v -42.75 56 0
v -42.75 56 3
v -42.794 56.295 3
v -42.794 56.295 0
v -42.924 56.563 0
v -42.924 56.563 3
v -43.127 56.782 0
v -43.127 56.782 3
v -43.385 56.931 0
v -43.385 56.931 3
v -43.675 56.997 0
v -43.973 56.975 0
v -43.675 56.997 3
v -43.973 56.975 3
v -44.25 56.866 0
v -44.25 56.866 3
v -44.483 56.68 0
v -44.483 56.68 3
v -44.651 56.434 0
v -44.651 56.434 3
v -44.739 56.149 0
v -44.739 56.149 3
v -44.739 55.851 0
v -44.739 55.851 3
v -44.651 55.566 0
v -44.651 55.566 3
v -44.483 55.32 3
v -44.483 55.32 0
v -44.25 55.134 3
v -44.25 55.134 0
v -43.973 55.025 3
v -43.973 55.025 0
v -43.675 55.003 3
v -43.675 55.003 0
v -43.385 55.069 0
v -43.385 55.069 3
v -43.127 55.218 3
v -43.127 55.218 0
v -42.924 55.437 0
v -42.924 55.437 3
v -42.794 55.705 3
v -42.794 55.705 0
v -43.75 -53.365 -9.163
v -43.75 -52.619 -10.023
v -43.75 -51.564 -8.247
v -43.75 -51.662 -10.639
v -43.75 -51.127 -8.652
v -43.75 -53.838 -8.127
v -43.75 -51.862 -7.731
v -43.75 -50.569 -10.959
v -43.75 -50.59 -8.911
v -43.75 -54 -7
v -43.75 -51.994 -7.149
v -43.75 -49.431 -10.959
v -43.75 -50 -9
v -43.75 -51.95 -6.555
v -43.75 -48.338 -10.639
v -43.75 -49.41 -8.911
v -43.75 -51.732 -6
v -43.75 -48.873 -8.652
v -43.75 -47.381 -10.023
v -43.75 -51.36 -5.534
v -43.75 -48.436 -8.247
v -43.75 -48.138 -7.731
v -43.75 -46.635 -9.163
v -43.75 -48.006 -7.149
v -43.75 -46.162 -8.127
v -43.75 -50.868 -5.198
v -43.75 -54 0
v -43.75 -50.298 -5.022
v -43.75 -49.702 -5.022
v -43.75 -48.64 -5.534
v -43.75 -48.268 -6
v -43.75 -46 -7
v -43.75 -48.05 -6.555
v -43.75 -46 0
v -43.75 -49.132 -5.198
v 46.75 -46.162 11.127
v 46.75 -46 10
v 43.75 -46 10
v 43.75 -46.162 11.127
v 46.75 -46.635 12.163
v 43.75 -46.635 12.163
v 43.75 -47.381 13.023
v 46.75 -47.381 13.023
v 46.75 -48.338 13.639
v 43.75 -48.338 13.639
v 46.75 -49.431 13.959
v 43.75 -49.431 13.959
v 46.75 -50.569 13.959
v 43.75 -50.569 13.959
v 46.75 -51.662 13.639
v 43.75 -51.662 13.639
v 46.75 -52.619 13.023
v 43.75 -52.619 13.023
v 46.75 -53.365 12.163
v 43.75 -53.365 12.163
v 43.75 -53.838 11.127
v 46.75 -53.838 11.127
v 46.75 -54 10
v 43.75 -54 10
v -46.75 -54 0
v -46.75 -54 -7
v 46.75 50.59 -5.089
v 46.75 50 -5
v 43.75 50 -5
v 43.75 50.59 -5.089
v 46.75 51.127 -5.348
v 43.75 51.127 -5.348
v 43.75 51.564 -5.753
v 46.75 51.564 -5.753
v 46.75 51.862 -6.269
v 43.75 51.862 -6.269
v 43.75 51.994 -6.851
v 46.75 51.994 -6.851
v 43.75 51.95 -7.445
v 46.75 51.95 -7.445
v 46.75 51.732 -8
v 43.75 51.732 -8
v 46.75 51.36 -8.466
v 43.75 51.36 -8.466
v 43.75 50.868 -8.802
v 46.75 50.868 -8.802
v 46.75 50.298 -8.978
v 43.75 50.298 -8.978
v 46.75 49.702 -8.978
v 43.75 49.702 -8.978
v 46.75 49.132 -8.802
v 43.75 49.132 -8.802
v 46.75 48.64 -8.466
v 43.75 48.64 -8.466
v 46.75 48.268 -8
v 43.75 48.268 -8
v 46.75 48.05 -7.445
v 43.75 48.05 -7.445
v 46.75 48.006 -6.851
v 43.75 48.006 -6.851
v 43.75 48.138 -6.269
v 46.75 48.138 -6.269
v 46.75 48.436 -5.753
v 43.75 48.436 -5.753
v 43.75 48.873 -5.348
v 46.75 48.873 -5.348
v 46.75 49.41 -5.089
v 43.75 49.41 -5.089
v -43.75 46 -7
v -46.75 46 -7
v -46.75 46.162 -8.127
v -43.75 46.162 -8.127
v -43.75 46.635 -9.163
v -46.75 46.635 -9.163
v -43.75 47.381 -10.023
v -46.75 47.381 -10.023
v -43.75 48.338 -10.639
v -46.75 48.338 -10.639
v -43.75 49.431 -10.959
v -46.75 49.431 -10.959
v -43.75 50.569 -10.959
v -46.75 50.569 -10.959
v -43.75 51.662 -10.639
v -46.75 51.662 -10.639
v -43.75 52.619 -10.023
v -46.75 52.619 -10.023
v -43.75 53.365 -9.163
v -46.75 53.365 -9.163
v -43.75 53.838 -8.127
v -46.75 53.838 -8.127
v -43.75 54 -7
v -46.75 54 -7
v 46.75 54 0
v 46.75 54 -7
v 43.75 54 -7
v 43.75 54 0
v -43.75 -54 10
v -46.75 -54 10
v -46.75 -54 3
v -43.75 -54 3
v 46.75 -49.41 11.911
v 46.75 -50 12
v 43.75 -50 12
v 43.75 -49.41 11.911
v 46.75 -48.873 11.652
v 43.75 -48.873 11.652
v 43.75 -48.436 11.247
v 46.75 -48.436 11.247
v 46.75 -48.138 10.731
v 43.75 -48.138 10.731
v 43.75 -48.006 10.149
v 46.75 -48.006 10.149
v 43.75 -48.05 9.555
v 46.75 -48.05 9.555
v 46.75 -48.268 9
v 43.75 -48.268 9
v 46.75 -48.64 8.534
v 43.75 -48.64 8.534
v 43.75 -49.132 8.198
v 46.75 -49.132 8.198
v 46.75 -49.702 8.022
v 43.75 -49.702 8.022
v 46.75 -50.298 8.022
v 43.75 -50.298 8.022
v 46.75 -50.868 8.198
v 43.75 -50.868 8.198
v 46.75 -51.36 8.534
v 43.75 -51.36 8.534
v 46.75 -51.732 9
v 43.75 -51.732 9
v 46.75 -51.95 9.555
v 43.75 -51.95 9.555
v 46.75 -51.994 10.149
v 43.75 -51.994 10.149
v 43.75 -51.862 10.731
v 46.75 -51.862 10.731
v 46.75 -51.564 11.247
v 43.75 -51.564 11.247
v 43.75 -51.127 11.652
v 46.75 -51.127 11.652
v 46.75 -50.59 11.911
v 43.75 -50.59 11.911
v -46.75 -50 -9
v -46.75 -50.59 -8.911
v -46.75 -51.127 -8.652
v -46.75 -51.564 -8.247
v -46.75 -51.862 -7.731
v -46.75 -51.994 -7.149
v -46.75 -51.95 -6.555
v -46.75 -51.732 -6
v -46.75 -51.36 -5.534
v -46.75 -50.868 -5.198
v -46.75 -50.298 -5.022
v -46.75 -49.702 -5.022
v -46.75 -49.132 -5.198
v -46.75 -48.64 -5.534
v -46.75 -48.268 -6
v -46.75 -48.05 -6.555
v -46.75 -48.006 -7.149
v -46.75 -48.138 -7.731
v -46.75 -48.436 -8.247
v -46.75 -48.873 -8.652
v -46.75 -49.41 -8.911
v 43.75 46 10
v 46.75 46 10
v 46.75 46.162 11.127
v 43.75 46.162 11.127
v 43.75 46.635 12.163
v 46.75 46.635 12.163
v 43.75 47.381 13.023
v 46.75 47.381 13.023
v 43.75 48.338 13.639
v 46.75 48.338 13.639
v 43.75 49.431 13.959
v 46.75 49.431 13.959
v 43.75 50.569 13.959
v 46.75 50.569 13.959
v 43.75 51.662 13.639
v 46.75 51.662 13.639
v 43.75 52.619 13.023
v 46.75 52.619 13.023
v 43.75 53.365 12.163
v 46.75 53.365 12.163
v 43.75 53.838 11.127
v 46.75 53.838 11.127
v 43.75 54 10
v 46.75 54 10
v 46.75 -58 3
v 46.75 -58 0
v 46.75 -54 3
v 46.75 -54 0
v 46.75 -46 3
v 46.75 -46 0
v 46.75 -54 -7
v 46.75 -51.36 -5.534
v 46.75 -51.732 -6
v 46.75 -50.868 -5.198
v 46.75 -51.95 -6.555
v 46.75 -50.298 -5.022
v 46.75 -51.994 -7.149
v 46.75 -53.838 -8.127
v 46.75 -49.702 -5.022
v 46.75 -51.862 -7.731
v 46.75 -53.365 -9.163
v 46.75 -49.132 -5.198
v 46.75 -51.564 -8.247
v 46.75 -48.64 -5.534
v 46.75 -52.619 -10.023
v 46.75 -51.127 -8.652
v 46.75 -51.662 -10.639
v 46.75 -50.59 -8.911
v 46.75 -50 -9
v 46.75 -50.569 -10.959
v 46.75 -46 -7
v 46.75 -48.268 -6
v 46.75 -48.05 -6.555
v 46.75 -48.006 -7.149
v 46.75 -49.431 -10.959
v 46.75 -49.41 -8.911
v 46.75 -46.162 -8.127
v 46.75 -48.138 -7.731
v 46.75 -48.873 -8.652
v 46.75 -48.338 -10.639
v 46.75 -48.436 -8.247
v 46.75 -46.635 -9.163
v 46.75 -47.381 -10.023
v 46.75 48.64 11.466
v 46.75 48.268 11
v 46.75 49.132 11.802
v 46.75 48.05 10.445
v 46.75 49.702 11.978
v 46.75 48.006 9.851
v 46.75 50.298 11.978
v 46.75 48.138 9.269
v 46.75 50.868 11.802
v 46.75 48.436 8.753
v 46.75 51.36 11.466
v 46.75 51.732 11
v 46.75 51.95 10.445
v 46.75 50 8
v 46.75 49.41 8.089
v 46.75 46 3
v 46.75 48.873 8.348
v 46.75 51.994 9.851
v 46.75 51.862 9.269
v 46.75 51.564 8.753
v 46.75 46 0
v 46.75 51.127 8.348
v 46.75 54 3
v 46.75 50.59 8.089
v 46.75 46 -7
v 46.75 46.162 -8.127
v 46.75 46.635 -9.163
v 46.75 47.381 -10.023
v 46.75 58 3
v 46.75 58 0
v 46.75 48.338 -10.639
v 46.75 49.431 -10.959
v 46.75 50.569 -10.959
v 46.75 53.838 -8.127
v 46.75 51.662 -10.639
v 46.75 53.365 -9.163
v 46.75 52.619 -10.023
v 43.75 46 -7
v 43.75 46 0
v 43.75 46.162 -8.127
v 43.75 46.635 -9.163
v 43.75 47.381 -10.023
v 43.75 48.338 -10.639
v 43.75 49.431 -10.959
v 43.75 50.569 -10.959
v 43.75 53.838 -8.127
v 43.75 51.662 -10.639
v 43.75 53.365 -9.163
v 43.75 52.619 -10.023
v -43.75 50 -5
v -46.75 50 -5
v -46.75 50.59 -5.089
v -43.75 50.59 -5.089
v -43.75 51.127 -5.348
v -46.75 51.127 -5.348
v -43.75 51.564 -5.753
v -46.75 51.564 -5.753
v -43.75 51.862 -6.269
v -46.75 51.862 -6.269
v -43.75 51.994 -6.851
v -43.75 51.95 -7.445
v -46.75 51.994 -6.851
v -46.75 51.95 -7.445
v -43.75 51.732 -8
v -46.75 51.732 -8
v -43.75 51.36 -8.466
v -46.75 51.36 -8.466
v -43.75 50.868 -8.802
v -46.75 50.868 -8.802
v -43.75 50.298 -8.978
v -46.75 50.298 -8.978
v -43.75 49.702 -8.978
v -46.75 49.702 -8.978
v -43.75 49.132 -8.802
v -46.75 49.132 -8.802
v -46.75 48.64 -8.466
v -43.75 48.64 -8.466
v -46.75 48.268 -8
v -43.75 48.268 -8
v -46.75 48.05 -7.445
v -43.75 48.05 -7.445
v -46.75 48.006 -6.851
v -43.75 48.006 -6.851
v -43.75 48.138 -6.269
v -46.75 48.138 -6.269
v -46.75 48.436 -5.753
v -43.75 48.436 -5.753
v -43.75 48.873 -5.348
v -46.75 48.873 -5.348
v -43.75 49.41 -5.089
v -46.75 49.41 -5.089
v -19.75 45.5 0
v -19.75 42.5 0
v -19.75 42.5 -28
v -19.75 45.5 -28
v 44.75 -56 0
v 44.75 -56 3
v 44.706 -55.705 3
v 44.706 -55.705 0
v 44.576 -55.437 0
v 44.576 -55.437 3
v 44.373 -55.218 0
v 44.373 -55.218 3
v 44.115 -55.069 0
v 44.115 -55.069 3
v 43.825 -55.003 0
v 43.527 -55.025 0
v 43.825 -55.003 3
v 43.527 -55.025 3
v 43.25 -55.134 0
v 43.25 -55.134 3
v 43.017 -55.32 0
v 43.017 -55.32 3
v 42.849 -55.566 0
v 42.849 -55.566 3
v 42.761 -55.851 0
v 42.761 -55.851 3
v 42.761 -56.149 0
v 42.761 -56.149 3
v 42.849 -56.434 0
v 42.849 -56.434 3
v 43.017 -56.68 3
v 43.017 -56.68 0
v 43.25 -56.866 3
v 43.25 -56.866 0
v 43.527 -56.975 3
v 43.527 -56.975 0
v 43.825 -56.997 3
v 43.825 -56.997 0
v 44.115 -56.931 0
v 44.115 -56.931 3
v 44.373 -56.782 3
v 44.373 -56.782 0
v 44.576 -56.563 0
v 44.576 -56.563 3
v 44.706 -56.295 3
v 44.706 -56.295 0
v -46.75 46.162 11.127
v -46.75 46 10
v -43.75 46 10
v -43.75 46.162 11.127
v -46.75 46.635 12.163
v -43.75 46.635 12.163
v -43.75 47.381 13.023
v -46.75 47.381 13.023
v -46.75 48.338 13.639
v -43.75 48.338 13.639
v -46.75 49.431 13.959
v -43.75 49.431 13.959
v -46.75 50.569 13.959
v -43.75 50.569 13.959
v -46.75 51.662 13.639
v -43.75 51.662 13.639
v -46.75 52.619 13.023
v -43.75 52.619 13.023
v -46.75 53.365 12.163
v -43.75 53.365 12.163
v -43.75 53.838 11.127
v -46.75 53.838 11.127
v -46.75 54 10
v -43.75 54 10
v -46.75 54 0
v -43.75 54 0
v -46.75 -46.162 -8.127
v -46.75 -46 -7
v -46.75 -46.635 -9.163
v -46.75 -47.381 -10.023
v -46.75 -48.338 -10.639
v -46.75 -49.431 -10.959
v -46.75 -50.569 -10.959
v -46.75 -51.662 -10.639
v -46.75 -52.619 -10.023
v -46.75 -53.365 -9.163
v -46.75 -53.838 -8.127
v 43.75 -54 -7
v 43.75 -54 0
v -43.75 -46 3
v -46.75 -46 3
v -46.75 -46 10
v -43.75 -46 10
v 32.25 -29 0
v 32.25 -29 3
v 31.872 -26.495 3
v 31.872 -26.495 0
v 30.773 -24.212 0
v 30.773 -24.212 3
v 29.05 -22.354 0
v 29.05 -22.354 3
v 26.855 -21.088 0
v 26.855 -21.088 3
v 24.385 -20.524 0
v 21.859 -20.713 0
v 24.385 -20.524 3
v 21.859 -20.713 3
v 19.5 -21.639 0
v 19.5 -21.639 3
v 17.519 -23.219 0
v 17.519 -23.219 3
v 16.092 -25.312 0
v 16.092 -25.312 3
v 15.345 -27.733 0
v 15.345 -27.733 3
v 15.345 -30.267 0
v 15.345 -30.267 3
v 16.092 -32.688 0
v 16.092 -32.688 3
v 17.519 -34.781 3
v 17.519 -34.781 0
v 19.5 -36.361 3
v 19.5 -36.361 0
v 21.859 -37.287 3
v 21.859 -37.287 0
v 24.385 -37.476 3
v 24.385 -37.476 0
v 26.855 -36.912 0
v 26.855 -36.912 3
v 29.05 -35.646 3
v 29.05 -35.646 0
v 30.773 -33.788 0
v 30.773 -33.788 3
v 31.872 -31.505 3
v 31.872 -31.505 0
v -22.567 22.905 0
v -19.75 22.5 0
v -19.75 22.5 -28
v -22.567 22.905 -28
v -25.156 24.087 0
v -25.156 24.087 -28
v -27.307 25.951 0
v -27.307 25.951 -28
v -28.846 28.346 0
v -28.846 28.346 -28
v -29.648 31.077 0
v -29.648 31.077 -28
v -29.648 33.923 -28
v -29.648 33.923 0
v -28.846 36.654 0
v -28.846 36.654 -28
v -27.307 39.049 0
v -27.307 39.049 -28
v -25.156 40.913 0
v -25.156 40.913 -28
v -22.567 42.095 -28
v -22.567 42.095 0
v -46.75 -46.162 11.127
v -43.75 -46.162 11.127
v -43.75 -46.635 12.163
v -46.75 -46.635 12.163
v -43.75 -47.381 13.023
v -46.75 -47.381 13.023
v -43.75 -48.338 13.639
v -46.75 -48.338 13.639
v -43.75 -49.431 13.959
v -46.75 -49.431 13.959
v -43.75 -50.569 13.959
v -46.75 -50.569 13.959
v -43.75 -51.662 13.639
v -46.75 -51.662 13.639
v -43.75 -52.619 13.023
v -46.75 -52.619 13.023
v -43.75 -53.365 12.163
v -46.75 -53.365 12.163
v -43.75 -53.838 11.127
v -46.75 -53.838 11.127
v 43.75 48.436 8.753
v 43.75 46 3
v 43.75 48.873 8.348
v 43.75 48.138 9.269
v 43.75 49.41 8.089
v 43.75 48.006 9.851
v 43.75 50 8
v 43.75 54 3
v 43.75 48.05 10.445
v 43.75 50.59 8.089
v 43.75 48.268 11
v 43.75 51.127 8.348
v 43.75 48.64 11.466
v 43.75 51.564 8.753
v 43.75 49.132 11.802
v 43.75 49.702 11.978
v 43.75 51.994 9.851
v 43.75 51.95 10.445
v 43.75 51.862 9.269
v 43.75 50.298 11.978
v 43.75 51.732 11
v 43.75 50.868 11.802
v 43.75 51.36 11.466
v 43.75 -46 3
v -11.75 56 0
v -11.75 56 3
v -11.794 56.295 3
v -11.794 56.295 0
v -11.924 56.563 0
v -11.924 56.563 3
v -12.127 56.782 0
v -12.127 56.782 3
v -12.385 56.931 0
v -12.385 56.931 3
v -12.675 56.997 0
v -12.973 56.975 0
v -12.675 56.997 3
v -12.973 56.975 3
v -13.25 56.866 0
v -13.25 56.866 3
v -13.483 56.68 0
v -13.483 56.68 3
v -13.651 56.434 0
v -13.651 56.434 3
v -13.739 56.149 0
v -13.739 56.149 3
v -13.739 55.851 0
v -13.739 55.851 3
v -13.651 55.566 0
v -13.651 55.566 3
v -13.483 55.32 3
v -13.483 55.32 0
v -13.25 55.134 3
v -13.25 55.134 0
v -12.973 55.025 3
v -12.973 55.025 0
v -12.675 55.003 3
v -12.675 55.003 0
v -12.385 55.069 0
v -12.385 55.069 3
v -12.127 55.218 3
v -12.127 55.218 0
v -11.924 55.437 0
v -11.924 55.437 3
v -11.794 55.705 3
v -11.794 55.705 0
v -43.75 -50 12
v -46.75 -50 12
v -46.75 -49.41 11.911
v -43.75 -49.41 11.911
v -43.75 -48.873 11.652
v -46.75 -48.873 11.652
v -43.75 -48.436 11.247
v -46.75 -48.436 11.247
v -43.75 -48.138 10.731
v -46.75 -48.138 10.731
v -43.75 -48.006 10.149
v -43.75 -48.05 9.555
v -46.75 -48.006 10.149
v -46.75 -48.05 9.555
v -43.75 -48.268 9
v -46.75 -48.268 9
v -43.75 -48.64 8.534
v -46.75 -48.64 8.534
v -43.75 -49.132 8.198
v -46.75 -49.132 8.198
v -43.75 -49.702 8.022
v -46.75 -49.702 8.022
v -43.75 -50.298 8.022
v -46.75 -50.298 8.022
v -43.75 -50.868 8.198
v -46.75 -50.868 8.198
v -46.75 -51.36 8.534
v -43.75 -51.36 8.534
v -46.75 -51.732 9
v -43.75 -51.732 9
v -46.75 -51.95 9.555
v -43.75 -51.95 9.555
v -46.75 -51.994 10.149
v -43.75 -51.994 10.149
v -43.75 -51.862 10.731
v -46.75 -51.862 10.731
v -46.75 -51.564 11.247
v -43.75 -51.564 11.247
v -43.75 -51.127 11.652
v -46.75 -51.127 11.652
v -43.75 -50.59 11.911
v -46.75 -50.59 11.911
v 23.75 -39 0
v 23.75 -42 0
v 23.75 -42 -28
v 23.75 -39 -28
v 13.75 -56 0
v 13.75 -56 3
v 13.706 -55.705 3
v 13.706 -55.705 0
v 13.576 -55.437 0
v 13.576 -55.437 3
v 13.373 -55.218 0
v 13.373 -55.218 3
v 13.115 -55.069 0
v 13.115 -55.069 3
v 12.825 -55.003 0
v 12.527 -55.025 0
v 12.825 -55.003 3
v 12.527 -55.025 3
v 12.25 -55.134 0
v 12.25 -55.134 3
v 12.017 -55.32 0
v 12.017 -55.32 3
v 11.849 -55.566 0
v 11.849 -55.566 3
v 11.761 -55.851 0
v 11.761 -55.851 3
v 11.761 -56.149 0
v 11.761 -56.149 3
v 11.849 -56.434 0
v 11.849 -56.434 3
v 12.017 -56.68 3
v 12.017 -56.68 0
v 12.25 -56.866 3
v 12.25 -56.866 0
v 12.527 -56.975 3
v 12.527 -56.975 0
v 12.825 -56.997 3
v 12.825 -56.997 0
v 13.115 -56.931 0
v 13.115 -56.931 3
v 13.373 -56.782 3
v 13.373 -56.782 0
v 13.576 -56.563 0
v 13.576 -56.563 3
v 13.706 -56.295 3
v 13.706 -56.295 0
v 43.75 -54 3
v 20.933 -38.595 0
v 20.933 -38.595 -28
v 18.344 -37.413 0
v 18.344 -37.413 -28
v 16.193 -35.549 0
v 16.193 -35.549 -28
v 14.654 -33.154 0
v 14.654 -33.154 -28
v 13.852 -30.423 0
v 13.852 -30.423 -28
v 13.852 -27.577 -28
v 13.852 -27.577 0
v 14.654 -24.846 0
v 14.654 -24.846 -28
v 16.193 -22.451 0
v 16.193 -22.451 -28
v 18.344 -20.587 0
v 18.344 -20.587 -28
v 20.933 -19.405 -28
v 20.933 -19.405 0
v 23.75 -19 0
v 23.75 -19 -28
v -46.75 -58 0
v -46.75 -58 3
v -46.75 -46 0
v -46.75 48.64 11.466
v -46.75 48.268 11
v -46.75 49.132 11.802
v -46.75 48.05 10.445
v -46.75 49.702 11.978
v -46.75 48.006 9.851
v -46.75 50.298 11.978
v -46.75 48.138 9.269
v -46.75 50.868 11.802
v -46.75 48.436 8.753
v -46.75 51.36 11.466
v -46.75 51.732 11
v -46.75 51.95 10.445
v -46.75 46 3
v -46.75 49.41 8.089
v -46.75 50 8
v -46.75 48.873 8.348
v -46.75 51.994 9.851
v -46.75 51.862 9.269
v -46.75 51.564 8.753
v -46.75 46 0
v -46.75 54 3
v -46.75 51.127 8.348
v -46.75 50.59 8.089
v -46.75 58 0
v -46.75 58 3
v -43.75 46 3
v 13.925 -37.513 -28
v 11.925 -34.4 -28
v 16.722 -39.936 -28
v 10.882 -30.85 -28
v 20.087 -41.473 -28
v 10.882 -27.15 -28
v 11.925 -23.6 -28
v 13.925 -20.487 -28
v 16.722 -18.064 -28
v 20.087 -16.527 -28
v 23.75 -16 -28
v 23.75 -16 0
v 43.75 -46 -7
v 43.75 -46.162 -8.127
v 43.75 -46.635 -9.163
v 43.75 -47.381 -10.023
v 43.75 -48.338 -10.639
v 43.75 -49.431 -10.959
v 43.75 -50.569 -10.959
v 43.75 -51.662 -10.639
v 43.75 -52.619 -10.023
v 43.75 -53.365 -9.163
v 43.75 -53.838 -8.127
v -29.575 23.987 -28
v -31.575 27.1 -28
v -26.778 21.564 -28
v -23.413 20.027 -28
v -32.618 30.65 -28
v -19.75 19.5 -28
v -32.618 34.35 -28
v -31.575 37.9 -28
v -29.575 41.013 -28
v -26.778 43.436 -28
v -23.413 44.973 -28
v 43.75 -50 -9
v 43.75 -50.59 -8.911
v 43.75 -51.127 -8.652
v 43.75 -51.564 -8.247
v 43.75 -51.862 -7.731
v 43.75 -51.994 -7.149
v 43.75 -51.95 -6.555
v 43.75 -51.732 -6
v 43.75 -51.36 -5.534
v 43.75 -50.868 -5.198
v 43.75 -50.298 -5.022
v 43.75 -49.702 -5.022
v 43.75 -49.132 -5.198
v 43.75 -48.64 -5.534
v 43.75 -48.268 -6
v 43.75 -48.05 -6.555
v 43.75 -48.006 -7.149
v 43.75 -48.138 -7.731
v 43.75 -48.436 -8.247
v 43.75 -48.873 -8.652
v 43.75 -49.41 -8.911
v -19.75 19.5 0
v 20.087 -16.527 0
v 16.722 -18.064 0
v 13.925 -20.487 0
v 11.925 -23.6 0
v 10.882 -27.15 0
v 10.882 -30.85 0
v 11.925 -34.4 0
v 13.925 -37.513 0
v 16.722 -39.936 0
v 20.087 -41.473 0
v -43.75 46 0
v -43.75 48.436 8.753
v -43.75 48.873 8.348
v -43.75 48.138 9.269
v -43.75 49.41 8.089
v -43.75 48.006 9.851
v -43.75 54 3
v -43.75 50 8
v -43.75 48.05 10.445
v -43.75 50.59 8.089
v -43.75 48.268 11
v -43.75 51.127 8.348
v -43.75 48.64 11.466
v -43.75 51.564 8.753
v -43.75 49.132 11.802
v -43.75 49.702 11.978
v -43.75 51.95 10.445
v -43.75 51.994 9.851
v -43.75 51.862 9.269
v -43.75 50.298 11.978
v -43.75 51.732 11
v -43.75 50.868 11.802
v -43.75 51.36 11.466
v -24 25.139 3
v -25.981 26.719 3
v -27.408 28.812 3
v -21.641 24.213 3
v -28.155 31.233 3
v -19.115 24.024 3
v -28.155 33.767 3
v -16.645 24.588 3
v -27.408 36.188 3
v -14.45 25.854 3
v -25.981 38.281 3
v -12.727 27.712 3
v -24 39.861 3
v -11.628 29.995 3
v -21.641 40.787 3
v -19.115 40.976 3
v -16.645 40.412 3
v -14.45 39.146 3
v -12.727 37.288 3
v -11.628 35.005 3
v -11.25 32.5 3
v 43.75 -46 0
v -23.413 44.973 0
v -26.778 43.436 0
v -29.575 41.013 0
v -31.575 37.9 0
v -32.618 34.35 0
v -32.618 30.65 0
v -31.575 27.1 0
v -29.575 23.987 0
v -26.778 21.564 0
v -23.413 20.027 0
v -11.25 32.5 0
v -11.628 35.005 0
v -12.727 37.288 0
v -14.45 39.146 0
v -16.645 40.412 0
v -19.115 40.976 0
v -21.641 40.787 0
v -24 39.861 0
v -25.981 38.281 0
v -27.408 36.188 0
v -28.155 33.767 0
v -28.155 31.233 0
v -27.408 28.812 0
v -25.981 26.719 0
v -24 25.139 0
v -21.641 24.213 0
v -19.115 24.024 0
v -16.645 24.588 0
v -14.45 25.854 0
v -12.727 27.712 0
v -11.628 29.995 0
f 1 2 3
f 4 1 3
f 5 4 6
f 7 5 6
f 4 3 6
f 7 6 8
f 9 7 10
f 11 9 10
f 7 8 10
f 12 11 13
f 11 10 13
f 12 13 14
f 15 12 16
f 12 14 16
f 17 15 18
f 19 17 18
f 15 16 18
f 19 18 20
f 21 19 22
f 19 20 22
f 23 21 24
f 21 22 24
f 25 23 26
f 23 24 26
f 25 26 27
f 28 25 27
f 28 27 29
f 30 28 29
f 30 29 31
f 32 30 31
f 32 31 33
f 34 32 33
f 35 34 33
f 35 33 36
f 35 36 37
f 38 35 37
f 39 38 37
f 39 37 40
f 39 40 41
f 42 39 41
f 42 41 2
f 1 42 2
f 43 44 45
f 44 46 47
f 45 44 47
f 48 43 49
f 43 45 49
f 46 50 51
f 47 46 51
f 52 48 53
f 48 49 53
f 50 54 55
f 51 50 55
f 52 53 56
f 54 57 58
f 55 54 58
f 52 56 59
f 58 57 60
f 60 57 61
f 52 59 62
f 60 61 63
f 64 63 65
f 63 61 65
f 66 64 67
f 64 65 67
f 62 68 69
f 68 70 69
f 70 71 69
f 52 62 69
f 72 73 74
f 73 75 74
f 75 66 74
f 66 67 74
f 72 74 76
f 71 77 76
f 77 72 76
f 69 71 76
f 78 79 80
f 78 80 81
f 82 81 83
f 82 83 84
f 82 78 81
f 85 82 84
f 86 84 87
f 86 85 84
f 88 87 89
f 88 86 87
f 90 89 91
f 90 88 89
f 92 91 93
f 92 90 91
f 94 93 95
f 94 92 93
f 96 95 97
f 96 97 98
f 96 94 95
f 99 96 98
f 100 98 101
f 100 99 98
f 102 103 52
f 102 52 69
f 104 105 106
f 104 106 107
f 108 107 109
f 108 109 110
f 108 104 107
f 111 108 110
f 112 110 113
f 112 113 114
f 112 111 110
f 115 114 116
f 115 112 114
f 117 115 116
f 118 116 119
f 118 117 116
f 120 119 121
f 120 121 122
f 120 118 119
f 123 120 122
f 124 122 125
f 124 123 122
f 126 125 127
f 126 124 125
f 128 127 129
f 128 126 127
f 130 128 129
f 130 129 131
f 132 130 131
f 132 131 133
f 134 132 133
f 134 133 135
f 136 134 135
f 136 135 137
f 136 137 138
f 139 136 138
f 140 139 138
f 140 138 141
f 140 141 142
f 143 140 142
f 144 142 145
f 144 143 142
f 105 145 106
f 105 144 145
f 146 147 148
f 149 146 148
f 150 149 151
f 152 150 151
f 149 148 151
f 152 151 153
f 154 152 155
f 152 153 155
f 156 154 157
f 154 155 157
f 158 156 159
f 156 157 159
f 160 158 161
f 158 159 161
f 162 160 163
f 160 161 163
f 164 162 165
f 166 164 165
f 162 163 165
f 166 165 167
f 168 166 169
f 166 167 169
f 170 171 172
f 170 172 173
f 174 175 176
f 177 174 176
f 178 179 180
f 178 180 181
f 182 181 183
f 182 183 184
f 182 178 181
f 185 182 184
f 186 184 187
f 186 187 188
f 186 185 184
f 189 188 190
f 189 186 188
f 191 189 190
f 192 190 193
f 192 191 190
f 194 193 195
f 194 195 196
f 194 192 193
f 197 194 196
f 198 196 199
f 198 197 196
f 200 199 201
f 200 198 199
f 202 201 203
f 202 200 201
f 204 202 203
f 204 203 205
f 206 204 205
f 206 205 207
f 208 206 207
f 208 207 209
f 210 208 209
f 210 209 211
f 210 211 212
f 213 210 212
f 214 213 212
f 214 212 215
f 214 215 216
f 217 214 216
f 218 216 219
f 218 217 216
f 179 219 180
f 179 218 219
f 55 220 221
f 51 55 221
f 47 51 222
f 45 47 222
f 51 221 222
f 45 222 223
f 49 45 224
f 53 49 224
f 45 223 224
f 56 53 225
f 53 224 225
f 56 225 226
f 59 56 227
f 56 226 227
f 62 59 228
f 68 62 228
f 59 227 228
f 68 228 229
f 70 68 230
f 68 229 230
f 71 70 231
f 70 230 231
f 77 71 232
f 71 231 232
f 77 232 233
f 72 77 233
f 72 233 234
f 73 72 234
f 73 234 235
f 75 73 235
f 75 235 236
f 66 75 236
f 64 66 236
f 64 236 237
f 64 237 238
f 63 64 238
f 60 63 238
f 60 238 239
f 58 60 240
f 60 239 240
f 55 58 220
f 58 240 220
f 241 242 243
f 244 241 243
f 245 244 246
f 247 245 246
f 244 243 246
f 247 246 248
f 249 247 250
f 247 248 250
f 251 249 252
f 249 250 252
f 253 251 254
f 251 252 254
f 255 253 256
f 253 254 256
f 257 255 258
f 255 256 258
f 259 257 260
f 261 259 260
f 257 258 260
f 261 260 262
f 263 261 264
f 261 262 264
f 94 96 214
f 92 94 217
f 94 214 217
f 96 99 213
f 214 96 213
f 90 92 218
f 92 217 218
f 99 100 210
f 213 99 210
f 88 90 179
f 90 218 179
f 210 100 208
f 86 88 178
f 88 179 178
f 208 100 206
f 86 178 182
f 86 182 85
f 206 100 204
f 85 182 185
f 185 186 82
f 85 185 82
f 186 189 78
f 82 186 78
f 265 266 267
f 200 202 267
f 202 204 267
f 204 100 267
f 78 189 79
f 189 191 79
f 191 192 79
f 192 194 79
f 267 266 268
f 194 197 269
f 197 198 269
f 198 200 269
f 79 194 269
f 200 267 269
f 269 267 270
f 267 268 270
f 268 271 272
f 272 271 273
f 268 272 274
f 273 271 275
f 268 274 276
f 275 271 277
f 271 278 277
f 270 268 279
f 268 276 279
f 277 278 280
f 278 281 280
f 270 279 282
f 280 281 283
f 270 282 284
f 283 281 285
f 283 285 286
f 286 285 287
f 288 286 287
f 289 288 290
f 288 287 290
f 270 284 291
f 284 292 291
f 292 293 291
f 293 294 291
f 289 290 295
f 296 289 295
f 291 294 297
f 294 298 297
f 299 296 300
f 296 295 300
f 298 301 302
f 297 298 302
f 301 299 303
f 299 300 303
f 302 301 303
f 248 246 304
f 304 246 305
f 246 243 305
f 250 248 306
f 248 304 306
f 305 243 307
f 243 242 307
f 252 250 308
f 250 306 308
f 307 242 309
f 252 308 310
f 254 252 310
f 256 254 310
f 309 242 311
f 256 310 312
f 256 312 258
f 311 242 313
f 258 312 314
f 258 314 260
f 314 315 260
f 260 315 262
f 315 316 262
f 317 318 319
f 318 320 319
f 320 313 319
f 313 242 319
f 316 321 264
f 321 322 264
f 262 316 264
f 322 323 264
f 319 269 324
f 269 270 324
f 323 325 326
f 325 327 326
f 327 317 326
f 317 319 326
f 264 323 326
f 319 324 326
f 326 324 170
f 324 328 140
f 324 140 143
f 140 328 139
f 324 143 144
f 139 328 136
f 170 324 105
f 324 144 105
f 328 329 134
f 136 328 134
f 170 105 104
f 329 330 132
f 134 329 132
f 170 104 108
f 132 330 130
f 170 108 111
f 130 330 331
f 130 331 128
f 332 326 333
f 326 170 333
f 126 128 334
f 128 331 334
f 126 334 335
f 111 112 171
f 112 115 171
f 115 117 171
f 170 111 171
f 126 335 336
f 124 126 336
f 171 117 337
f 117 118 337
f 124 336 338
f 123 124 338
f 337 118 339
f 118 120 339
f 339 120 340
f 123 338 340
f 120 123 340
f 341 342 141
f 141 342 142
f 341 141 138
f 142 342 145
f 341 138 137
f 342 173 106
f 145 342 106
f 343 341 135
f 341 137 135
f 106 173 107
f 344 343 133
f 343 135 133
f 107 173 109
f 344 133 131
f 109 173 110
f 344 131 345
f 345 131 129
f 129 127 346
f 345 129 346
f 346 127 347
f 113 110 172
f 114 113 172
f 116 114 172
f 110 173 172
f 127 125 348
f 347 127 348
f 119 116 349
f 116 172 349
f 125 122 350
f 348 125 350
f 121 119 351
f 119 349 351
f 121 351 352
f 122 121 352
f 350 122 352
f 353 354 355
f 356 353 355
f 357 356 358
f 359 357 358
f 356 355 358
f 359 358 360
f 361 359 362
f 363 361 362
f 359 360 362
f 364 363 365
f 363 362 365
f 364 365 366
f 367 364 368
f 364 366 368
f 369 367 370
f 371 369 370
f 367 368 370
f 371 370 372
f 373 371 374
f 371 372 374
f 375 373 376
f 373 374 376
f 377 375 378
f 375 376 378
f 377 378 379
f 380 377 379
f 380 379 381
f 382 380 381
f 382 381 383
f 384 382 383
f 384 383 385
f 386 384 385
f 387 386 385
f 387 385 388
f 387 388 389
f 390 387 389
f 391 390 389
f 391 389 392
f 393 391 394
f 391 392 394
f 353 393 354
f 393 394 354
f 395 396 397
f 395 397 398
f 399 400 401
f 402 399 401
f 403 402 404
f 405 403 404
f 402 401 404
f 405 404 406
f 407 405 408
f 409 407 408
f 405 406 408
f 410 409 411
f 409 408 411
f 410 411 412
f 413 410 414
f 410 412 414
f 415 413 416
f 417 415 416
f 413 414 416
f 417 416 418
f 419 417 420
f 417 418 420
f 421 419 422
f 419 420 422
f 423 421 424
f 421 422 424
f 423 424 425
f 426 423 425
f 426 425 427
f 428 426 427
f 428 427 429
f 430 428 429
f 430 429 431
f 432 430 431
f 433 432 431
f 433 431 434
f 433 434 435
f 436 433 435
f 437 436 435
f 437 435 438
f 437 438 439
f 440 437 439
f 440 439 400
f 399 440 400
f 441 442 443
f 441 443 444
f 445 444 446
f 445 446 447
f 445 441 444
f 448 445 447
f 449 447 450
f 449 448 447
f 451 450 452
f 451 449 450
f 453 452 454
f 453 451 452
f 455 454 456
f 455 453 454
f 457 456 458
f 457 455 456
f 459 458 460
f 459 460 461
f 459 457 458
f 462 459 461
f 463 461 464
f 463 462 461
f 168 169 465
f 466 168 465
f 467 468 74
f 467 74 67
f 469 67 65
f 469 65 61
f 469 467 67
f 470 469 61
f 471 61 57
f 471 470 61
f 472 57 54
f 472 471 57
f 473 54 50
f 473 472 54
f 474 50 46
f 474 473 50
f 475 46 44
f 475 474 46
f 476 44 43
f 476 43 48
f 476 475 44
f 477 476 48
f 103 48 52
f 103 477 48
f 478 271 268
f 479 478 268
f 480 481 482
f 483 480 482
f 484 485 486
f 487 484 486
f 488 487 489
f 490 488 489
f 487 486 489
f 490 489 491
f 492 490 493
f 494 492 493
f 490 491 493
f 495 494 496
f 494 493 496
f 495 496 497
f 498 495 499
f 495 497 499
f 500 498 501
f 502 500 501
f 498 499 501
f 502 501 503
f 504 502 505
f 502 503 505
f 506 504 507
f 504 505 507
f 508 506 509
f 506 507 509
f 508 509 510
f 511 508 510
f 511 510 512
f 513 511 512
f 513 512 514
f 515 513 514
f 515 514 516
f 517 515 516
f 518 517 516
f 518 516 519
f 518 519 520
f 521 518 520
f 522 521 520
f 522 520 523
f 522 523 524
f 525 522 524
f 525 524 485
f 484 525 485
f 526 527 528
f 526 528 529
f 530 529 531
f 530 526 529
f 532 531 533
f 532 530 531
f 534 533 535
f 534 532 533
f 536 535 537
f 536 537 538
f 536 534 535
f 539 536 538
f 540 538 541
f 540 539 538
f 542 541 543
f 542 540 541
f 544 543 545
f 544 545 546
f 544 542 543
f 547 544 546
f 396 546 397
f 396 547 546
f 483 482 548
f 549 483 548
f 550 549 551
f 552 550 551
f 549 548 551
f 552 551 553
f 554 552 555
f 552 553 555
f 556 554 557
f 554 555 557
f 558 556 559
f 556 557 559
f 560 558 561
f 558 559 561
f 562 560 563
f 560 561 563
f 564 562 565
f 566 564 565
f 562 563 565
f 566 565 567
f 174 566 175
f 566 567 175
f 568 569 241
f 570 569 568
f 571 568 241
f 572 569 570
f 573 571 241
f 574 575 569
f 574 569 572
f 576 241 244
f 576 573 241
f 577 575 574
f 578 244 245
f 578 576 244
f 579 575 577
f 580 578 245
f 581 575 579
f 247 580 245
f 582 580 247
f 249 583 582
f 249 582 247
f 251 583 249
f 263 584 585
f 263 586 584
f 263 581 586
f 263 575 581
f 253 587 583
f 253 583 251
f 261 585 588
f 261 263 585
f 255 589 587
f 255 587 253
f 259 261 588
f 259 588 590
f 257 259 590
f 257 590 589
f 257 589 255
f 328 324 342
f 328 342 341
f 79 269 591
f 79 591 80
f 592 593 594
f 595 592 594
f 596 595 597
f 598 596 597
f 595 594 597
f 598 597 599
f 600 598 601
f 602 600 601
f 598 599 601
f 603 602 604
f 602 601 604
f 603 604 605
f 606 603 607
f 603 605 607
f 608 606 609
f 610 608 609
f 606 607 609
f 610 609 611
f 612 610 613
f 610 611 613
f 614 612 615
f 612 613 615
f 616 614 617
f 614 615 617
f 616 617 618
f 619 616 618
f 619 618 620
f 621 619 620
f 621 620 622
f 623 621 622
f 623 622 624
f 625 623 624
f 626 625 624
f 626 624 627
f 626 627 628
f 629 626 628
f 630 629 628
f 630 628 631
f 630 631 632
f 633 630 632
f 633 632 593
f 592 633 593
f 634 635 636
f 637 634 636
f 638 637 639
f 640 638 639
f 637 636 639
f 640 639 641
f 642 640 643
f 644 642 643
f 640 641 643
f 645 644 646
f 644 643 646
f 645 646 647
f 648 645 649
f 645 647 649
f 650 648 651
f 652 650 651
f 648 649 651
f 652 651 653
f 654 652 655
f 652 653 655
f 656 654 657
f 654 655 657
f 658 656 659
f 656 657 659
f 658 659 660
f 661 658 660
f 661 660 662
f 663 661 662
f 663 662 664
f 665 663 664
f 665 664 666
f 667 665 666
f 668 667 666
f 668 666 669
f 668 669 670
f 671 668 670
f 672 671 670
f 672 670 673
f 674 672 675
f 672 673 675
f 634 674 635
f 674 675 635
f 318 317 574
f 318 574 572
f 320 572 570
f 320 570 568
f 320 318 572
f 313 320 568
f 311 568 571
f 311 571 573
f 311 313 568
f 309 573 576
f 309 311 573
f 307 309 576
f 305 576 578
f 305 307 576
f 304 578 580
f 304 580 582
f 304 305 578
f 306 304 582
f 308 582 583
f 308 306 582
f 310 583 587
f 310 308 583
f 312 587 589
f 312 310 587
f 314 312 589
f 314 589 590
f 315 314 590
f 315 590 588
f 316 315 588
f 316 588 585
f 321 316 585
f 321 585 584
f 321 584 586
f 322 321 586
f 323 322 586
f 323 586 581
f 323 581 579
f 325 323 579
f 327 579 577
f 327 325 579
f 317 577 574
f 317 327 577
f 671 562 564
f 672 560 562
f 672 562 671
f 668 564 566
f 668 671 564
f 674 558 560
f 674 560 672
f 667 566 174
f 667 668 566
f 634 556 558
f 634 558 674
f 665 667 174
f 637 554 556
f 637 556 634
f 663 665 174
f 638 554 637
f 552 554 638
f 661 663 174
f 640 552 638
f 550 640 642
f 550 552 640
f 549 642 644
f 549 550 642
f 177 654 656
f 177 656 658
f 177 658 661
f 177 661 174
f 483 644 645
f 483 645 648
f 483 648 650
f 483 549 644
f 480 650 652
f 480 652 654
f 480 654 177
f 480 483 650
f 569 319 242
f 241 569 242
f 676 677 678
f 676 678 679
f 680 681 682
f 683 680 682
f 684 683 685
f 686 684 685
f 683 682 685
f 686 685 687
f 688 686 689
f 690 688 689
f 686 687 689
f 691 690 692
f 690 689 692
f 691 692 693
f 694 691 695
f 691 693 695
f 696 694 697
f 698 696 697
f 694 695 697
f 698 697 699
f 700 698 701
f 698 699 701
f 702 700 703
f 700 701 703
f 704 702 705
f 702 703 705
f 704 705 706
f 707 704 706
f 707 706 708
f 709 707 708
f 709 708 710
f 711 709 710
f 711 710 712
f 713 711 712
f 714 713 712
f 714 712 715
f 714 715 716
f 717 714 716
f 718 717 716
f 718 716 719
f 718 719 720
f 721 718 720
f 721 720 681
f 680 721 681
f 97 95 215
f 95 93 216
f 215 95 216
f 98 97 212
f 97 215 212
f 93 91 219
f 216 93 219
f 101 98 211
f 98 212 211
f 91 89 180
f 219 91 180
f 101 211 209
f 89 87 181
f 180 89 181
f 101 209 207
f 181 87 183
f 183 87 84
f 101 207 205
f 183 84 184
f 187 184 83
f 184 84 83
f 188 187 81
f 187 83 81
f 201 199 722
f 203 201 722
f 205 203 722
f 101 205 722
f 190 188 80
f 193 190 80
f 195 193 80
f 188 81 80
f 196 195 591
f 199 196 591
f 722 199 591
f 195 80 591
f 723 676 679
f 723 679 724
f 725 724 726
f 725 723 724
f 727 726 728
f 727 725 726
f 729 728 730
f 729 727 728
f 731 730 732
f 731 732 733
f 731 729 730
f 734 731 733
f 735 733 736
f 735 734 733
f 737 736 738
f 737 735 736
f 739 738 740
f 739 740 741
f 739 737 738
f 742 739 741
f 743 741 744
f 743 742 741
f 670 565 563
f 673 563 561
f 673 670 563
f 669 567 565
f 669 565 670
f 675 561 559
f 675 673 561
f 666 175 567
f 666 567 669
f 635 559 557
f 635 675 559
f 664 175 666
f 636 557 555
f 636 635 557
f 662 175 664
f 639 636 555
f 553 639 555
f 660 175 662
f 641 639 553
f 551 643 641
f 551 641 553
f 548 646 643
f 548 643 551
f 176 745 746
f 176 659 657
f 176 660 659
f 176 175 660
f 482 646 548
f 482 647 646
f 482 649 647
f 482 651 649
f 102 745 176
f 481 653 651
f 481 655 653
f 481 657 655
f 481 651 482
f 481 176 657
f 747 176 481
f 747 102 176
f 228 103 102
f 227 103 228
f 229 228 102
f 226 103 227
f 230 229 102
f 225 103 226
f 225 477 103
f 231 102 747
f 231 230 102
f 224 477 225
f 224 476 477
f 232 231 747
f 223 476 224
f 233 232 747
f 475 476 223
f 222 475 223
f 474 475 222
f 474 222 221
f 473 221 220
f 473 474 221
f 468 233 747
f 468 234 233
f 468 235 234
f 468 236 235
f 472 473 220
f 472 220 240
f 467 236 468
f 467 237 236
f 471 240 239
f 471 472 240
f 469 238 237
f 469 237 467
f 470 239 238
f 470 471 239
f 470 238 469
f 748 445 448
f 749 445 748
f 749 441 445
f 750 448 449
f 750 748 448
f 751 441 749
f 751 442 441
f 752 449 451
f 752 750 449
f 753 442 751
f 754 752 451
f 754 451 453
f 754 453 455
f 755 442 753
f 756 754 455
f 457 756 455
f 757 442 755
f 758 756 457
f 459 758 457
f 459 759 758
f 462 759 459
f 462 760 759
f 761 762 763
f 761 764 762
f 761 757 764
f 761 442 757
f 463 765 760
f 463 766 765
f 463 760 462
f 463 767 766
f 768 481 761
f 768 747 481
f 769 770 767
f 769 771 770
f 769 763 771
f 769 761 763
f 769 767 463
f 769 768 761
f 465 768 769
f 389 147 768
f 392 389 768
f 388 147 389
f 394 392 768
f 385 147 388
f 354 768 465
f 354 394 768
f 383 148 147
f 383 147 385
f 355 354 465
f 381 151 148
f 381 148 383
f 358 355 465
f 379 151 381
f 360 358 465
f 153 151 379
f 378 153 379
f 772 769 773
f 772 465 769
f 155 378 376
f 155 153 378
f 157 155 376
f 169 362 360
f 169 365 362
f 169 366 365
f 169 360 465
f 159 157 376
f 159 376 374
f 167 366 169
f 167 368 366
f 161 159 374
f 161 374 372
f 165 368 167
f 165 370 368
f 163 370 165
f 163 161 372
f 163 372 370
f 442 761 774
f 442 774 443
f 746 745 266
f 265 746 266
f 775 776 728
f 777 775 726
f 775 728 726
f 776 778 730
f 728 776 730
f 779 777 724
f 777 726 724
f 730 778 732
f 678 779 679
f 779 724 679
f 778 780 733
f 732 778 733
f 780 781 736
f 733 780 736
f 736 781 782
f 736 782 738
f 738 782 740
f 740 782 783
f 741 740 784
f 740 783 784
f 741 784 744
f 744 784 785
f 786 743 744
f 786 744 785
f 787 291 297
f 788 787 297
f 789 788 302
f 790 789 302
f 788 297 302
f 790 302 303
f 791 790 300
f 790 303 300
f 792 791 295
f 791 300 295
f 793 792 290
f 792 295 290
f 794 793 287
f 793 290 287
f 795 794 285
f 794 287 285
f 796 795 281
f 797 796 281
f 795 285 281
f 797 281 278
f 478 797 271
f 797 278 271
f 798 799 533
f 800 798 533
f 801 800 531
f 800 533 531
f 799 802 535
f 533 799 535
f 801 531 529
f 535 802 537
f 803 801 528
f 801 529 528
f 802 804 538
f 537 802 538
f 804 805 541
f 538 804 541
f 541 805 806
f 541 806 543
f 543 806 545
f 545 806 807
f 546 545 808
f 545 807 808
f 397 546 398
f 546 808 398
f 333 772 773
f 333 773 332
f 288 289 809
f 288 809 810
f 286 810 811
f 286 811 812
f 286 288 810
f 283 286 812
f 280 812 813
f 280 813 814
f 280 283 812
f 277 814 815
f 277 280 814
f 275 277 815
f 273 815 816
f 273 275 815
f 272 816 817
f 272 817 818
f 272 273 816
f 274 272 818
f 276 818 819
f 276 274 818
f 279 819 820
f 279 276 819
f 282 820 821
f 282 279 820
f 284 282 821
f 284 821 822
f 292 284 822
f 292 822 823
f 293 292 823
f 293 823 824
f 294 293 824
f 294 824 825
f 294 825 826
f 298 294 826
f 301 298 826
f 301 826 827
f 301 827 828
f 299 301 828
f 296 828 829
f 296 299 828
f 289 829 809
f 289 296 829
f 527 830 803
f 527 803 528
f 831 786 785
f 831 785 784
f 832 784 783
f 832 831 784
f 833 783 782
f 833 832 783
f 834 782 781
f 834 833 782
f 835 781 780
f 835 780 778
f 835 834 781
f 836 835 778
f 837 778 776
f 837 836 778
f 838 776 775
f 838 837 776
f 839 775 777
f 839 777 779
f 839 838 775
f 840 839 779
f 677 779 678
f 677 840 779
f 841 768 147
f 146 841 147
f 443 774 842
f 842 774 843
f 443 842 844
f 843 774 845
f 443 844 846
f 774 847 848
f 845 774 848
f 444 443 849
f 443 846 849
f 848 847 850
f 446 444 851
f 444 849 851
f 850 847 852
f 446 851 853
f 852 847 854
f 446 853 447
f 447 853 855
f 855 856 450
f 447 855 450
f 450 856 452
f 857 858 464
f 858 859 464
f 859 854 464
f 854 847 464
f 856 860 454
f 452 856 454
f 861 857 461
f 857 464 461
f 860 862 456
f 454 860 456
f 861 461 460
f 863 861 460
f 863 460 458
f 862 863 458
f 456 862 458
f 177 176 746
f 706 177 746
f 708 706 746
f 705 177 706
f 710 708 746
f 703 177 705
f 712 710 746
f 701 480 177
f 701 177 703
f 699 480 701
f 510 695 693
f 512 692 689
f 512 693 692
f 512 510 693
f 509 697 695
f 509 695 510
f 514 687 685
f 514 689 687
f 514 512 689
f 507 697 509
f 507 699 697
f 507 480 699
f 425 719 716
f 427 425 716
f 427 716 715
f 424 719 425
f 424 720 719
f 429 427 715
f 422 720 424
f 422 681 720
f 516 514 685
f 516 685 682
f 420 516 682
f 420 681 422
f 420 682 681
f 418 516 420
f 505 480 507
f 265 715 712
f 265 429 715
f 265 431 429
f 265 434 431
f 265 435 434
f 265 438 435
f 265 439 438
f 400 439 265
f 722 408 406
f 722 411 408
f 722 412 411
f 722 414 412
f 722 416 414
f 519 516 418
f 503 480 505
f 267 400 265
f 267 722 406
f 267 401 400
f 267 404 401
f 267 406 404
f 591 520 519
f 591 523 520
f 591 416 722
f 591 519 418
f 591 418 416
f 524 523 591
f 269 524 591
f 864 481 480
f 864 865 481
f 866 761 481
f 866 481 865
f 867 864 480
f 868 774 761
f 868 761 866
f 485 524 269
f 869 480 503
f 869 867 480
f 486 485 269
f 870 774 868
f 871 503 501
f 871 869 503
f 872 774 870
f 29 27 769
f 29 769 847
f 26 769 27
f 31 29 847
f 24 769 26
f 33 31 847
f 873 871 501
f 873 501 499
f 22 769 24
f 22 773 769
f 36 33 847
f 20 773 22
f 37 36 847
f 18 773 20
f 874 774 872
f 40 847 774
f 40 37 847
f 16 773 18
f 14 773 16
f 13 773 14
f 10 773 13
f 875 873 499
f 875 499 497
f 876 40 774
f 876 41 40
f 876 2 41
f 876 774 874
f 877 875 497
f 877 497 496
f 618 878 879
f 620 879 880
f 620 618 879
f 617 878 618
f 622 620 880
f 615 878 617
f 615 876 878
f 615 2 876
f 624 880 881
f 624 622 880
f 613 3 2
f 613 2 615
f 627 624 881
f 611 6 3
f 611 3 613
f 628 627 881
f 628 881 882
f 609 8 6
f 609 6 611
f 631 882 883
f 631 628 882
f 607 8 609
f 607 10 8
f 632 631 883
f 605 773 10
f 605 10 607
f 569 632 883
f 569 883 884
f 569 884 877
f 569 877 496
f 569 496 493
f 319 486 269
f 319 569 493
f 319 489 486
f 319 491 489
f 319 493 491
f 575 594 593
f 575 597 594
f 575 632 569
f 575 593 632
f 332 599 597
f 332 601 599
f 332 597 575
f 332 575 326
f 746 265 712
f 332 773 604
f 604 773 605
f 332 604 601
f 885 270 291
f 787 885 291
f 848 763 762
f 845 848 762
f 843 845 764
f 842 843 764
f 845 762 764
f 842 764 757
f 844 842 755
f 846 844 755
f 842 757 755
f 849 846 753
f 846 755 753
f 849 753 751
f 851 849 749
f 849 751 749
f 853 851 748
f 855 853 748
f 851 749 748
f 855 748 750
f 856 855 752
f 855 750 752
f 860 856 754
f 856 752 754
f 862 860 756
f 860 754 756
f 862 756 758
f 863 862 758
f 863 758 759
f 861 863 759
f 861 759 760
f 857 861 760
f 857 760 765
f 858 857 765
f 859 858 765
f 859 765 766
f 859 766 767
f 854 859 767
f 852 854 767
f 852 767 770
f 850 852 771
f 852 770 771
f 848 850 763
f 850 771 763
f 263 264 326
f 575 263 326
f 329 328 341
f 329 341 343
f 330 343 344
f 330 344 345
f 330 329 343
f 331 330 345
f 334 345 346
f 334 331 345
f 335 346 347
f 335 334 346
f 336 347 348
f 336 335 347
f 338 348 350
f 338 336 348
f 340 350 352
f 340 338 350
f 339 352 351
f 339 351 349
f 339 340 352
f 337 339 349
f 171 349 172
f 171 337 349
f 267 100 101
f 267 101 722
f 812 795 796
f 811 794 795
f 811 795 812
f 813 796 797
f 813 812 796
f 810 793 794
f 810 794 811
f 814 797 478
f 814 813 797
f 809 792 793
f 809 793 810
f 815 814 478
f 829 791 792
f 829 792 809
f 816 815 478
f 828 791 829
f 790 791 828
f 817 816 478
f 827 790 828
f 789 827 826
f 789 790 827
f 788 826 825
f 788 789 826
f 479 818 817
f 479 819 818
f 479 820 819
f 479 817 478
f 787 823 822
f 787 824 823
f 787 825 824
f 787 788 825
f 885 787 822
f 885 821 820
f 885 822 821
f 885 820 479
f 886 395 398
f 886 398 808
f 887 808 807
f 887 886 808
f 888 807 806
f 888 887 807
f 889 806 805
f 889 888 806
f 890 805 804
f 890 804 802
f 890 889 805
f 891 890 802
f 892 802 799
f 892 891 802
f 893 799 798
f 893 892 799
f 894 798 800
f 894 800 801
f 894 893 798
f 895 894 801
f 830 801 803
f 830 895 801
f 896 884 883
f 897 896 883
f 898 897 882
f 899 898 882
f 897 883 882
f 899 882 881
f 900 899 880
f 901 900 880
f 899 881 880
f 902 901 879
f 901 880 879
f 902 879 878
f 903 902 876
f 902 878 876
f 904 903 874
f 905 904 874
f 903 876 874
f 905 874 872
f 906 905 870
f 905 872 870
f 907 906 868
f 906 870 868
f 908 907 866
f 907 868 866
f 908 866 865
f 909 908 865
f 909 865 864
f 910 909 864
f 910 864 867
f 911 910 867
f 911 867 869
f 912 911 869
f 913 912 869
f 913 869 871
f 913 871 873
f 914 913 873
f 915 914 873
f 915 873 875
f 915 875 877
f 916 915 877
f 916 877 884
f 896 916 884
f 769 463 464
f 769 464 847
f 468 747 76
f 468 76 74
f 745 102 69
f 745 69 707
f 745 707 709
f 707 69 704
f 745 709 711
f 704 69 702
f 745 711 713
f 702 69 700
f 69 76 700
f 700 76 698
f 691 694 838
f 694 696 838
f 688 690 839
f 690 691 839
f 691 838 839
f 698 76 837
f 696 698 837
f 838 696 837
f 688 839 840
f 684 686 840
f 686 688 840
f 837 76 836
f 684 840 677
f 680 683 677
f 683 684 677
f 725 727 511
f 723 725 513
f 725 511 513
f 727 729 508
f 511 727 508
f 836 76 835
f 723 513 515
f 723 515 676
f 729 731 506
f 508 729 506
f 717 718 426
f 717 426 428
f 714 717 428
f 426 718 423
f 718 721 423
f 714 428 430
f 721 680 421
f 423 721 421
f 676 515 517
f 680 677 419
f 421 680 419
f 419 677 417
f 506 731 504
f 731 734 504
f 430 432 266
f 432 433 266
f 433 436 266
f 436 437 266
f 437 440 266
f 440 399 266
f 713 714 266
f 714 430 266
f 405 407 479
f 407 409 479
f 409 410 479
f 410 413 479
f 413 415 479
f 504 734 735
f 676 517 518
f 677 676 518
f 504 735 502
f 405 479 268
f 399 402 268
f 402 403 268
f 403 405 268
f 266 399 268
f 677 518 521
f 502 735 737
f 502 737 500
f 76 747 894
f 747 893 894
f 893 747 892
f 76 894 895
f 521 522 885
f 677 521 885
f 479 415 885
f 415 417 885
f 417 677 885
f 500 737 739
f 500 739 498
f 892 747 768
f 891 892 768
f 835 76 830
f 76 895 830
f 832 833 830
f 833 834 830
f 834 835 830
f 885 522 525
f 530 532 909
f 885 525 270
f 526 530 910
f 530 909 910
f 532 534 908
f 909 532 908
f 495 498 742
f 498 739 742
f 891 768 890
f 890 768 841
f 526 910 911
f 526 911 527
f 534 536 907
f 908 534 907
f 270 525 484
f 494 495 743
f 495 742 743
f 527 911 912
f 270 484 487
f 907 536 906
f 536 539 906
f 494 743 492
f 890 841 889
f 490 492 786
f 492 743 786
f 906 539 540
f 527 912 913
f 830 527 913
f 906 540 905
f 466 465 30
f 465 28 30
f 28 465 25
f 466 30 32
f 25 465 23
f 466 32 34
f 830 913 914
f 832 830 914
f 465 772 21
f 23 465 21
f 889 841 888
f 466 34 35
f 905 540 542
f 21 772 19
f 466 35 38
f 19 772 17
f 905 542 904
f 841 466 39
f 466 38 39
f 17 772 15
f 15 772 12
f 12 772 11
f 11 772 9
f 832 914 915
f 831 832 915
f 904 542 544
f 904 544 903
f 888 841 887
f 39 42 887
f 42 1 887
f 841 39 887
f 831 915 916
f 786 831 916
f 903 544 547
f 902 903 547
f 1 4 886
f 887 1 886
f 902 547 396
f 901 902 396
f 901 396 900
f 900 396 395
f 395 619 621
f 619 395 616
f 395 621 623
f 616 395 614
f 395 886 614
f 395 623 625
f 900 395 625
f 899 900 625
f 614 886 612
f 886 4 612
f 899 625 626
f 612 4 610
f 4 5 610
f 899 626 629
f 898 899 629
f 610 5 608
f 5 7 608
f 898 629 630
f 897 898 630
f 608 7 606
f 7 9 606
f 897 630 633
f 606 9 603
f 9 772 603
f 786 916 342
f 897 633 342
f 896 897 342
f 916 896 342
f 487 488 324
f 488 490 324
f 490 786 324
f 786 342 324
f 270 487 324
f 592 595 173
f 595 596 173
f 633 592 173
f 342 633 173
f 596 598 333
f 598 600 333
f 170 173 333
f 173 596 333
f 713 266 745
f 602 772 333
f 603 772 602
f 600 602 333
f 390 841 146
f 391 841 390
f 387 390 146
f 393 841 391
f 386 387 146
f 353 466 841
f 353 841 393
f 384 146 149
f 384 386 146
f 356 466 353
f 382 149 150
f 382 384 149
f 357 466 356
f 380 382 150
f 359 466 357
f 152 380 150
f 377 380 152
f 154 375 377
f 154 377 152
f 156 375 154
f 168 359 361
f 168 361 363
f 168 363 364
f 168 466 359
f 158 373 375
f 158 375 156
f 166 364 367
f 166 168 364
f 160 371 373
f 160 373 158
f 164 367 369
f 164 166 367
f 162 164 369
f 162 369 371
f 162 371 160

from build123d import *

# Parameters (mm, degrees)
SKETCH1_W           = 93.5
SKETCH1_H           = 116
BOSS_EXTRUDE1_DEPTH = 3
SKETCH2_R           = 8.5
CUT_EXTRUDE1_DEPTH  = 75.555767718
SKETCH4_R           = 2
BOSS_EXTRUDE3_DEPTH = 3
SKETCH6_R           = 1
CUT_EXTRUDE2_DEPTH  = 10
BOSS_EXTRUDE4_DEPTH = 28


with BuildPart() as part:
    # Sketch1 → Boss-Extrude1 (new body)
    with BuildSketch(Plane.XY):
        Rectangle(SKETCH1_W, SKETCH1_H)
    extrude(amount=BOSS_EXTRUDE1_DEPTH)

    # Sketch2 → Cut-Extrude1 (cut, through all)
    with BuildSketch(Plane.XY.offset(3)):
        with Locations((-19.75, 32.5)):
            Circle(SKETCH2_R)
        with Locations((23.75, -29)):
            Circle(SKETCH2_R)
    extrude(amount=-CUT_EXTRUDE1_DEPTH, mode=Mode.SUBTRACT)

    # Sketch4 → Boss-Extrude3 (add)
    # profile 1 of 4: a face of its own
    with BuildSketch(Plane.ZY.offset(46.75)):
        with BuildLine():
            Line((-7, 54), (0, 54))
            Line((0, 54), (0, 46))
            Line((0, 46), (-7, 46))
            ThreePointArc((-7, 46), (-11, 50), (-7, 54))
        make_face()
        with Locations((-7, 50)):
            Circle(SKETCH4_R, mode=Mode.SUBTRACT)
    # profile 2 of 4: a face of its own
    with BuildSketch(Plane.ZY.offset(46.75)):
        with BuildLine():
            Line((0, -46), (-7, -46))
            ThreePointArc((-7, -46), (-11, -50), (-7, -54))
            Line((-7, -54), (0, -54))
            Line((0, -54), (0, -46))
        make_face()
        with Locations((-7, -50)):
            Circle(SKETCH4_R, mode=Mode.SUBTRACT)
    # profile 3 of 4: a face of its own
    with BuildSketch(Plane.ZY.offset(46.75)):
        with BuildLine():
            Line((3, 46), (10, 46))
            ThreePointArc((10, 46), (14, 50), (10, 54))
            Line((10, 54), (3, 54))
            Line((3, 54), (3, 46))
        make_face()
        with Locations((10, 50)):
            Circle(SKETCH4_R, mode=Mode.SUBTRACT)
    # profile 4 of 4: a face of its own
    with BuildSketch(Plane.ZY.offset(46.75)):
        with BuildLine():
            Line((10, -54), (3, -54))
            Line((3, -54), (3, -46))
            Line((3, -46), (10, -46))
            ThreePointArc((10, -46), (14, -50), (10, -54))
        make_face()
        with Locations((10, -50)):
            Circle(SKETCH4_R, mode=Mode.SUBTRACT)
    boss_extrude3 = extrude(amount=-BOSS_EXTRUDE3_DEPTH)

    # Sketch6 → Cut-Extrude2 (cut)
    with BuildSketch(Plane.XY.offset(3)):
        with Locations((-43.75, 56)):
            Circle(SKETCH6_R)
        with Locations((-12.75, 56)):
            Circle(SKETCH6_R)
        with Locations((43.75, -56)):
            Circle(SKETCH6_R)
        with Locations((12.75, -56)):
            Circle(SKETCH6_R)
    extrude(amount=-CUT_EXTRUDE2_DEPTH, mode=Mode.SUBTRACT)

    # Sketch5 → Boss-Extrude4 (add)
    with BuildSketch(Plane(origin=(0, 0, 0), x_dir=(-1, 0, 0), z_dir=(0, 0, -1))):
        with BuildLine():
            Line((19.75, 45.5), (19.75, 42.5))
            ThreePointArc((19.75, 42.5), (29.75, 32.5), (19.75, 22.5))
            Line((19.75, 22.5), (19.75, 19.5))
            ThreePointArc((19.75, 19.5), (32.75, 32.5), (19.75, 45.5))
        make_face()
        with BuildLine():
            Line((-23.75, -16), (-23.75, -19))
            ThreePointArc((-23.75, -19), (-13.75, -29), (-23.75, -39))
            Line((-23.75, -39), (-23.75, -42))
            ThreePointArc((-23.75, -42), (-10.75, -29), (-23.75, -16))
        make_face()
    extrude(amount=BOSS_EXTRUDE4_DEPTH)

    # Mirror1: Boss-Extrude3 across plane
    add(boss_extrude3.mirror(Plane(origin=(0, 0, 0), x_dir=(0, 0, 1), z_dir=(1, 0, 0))))


solid = part.part
